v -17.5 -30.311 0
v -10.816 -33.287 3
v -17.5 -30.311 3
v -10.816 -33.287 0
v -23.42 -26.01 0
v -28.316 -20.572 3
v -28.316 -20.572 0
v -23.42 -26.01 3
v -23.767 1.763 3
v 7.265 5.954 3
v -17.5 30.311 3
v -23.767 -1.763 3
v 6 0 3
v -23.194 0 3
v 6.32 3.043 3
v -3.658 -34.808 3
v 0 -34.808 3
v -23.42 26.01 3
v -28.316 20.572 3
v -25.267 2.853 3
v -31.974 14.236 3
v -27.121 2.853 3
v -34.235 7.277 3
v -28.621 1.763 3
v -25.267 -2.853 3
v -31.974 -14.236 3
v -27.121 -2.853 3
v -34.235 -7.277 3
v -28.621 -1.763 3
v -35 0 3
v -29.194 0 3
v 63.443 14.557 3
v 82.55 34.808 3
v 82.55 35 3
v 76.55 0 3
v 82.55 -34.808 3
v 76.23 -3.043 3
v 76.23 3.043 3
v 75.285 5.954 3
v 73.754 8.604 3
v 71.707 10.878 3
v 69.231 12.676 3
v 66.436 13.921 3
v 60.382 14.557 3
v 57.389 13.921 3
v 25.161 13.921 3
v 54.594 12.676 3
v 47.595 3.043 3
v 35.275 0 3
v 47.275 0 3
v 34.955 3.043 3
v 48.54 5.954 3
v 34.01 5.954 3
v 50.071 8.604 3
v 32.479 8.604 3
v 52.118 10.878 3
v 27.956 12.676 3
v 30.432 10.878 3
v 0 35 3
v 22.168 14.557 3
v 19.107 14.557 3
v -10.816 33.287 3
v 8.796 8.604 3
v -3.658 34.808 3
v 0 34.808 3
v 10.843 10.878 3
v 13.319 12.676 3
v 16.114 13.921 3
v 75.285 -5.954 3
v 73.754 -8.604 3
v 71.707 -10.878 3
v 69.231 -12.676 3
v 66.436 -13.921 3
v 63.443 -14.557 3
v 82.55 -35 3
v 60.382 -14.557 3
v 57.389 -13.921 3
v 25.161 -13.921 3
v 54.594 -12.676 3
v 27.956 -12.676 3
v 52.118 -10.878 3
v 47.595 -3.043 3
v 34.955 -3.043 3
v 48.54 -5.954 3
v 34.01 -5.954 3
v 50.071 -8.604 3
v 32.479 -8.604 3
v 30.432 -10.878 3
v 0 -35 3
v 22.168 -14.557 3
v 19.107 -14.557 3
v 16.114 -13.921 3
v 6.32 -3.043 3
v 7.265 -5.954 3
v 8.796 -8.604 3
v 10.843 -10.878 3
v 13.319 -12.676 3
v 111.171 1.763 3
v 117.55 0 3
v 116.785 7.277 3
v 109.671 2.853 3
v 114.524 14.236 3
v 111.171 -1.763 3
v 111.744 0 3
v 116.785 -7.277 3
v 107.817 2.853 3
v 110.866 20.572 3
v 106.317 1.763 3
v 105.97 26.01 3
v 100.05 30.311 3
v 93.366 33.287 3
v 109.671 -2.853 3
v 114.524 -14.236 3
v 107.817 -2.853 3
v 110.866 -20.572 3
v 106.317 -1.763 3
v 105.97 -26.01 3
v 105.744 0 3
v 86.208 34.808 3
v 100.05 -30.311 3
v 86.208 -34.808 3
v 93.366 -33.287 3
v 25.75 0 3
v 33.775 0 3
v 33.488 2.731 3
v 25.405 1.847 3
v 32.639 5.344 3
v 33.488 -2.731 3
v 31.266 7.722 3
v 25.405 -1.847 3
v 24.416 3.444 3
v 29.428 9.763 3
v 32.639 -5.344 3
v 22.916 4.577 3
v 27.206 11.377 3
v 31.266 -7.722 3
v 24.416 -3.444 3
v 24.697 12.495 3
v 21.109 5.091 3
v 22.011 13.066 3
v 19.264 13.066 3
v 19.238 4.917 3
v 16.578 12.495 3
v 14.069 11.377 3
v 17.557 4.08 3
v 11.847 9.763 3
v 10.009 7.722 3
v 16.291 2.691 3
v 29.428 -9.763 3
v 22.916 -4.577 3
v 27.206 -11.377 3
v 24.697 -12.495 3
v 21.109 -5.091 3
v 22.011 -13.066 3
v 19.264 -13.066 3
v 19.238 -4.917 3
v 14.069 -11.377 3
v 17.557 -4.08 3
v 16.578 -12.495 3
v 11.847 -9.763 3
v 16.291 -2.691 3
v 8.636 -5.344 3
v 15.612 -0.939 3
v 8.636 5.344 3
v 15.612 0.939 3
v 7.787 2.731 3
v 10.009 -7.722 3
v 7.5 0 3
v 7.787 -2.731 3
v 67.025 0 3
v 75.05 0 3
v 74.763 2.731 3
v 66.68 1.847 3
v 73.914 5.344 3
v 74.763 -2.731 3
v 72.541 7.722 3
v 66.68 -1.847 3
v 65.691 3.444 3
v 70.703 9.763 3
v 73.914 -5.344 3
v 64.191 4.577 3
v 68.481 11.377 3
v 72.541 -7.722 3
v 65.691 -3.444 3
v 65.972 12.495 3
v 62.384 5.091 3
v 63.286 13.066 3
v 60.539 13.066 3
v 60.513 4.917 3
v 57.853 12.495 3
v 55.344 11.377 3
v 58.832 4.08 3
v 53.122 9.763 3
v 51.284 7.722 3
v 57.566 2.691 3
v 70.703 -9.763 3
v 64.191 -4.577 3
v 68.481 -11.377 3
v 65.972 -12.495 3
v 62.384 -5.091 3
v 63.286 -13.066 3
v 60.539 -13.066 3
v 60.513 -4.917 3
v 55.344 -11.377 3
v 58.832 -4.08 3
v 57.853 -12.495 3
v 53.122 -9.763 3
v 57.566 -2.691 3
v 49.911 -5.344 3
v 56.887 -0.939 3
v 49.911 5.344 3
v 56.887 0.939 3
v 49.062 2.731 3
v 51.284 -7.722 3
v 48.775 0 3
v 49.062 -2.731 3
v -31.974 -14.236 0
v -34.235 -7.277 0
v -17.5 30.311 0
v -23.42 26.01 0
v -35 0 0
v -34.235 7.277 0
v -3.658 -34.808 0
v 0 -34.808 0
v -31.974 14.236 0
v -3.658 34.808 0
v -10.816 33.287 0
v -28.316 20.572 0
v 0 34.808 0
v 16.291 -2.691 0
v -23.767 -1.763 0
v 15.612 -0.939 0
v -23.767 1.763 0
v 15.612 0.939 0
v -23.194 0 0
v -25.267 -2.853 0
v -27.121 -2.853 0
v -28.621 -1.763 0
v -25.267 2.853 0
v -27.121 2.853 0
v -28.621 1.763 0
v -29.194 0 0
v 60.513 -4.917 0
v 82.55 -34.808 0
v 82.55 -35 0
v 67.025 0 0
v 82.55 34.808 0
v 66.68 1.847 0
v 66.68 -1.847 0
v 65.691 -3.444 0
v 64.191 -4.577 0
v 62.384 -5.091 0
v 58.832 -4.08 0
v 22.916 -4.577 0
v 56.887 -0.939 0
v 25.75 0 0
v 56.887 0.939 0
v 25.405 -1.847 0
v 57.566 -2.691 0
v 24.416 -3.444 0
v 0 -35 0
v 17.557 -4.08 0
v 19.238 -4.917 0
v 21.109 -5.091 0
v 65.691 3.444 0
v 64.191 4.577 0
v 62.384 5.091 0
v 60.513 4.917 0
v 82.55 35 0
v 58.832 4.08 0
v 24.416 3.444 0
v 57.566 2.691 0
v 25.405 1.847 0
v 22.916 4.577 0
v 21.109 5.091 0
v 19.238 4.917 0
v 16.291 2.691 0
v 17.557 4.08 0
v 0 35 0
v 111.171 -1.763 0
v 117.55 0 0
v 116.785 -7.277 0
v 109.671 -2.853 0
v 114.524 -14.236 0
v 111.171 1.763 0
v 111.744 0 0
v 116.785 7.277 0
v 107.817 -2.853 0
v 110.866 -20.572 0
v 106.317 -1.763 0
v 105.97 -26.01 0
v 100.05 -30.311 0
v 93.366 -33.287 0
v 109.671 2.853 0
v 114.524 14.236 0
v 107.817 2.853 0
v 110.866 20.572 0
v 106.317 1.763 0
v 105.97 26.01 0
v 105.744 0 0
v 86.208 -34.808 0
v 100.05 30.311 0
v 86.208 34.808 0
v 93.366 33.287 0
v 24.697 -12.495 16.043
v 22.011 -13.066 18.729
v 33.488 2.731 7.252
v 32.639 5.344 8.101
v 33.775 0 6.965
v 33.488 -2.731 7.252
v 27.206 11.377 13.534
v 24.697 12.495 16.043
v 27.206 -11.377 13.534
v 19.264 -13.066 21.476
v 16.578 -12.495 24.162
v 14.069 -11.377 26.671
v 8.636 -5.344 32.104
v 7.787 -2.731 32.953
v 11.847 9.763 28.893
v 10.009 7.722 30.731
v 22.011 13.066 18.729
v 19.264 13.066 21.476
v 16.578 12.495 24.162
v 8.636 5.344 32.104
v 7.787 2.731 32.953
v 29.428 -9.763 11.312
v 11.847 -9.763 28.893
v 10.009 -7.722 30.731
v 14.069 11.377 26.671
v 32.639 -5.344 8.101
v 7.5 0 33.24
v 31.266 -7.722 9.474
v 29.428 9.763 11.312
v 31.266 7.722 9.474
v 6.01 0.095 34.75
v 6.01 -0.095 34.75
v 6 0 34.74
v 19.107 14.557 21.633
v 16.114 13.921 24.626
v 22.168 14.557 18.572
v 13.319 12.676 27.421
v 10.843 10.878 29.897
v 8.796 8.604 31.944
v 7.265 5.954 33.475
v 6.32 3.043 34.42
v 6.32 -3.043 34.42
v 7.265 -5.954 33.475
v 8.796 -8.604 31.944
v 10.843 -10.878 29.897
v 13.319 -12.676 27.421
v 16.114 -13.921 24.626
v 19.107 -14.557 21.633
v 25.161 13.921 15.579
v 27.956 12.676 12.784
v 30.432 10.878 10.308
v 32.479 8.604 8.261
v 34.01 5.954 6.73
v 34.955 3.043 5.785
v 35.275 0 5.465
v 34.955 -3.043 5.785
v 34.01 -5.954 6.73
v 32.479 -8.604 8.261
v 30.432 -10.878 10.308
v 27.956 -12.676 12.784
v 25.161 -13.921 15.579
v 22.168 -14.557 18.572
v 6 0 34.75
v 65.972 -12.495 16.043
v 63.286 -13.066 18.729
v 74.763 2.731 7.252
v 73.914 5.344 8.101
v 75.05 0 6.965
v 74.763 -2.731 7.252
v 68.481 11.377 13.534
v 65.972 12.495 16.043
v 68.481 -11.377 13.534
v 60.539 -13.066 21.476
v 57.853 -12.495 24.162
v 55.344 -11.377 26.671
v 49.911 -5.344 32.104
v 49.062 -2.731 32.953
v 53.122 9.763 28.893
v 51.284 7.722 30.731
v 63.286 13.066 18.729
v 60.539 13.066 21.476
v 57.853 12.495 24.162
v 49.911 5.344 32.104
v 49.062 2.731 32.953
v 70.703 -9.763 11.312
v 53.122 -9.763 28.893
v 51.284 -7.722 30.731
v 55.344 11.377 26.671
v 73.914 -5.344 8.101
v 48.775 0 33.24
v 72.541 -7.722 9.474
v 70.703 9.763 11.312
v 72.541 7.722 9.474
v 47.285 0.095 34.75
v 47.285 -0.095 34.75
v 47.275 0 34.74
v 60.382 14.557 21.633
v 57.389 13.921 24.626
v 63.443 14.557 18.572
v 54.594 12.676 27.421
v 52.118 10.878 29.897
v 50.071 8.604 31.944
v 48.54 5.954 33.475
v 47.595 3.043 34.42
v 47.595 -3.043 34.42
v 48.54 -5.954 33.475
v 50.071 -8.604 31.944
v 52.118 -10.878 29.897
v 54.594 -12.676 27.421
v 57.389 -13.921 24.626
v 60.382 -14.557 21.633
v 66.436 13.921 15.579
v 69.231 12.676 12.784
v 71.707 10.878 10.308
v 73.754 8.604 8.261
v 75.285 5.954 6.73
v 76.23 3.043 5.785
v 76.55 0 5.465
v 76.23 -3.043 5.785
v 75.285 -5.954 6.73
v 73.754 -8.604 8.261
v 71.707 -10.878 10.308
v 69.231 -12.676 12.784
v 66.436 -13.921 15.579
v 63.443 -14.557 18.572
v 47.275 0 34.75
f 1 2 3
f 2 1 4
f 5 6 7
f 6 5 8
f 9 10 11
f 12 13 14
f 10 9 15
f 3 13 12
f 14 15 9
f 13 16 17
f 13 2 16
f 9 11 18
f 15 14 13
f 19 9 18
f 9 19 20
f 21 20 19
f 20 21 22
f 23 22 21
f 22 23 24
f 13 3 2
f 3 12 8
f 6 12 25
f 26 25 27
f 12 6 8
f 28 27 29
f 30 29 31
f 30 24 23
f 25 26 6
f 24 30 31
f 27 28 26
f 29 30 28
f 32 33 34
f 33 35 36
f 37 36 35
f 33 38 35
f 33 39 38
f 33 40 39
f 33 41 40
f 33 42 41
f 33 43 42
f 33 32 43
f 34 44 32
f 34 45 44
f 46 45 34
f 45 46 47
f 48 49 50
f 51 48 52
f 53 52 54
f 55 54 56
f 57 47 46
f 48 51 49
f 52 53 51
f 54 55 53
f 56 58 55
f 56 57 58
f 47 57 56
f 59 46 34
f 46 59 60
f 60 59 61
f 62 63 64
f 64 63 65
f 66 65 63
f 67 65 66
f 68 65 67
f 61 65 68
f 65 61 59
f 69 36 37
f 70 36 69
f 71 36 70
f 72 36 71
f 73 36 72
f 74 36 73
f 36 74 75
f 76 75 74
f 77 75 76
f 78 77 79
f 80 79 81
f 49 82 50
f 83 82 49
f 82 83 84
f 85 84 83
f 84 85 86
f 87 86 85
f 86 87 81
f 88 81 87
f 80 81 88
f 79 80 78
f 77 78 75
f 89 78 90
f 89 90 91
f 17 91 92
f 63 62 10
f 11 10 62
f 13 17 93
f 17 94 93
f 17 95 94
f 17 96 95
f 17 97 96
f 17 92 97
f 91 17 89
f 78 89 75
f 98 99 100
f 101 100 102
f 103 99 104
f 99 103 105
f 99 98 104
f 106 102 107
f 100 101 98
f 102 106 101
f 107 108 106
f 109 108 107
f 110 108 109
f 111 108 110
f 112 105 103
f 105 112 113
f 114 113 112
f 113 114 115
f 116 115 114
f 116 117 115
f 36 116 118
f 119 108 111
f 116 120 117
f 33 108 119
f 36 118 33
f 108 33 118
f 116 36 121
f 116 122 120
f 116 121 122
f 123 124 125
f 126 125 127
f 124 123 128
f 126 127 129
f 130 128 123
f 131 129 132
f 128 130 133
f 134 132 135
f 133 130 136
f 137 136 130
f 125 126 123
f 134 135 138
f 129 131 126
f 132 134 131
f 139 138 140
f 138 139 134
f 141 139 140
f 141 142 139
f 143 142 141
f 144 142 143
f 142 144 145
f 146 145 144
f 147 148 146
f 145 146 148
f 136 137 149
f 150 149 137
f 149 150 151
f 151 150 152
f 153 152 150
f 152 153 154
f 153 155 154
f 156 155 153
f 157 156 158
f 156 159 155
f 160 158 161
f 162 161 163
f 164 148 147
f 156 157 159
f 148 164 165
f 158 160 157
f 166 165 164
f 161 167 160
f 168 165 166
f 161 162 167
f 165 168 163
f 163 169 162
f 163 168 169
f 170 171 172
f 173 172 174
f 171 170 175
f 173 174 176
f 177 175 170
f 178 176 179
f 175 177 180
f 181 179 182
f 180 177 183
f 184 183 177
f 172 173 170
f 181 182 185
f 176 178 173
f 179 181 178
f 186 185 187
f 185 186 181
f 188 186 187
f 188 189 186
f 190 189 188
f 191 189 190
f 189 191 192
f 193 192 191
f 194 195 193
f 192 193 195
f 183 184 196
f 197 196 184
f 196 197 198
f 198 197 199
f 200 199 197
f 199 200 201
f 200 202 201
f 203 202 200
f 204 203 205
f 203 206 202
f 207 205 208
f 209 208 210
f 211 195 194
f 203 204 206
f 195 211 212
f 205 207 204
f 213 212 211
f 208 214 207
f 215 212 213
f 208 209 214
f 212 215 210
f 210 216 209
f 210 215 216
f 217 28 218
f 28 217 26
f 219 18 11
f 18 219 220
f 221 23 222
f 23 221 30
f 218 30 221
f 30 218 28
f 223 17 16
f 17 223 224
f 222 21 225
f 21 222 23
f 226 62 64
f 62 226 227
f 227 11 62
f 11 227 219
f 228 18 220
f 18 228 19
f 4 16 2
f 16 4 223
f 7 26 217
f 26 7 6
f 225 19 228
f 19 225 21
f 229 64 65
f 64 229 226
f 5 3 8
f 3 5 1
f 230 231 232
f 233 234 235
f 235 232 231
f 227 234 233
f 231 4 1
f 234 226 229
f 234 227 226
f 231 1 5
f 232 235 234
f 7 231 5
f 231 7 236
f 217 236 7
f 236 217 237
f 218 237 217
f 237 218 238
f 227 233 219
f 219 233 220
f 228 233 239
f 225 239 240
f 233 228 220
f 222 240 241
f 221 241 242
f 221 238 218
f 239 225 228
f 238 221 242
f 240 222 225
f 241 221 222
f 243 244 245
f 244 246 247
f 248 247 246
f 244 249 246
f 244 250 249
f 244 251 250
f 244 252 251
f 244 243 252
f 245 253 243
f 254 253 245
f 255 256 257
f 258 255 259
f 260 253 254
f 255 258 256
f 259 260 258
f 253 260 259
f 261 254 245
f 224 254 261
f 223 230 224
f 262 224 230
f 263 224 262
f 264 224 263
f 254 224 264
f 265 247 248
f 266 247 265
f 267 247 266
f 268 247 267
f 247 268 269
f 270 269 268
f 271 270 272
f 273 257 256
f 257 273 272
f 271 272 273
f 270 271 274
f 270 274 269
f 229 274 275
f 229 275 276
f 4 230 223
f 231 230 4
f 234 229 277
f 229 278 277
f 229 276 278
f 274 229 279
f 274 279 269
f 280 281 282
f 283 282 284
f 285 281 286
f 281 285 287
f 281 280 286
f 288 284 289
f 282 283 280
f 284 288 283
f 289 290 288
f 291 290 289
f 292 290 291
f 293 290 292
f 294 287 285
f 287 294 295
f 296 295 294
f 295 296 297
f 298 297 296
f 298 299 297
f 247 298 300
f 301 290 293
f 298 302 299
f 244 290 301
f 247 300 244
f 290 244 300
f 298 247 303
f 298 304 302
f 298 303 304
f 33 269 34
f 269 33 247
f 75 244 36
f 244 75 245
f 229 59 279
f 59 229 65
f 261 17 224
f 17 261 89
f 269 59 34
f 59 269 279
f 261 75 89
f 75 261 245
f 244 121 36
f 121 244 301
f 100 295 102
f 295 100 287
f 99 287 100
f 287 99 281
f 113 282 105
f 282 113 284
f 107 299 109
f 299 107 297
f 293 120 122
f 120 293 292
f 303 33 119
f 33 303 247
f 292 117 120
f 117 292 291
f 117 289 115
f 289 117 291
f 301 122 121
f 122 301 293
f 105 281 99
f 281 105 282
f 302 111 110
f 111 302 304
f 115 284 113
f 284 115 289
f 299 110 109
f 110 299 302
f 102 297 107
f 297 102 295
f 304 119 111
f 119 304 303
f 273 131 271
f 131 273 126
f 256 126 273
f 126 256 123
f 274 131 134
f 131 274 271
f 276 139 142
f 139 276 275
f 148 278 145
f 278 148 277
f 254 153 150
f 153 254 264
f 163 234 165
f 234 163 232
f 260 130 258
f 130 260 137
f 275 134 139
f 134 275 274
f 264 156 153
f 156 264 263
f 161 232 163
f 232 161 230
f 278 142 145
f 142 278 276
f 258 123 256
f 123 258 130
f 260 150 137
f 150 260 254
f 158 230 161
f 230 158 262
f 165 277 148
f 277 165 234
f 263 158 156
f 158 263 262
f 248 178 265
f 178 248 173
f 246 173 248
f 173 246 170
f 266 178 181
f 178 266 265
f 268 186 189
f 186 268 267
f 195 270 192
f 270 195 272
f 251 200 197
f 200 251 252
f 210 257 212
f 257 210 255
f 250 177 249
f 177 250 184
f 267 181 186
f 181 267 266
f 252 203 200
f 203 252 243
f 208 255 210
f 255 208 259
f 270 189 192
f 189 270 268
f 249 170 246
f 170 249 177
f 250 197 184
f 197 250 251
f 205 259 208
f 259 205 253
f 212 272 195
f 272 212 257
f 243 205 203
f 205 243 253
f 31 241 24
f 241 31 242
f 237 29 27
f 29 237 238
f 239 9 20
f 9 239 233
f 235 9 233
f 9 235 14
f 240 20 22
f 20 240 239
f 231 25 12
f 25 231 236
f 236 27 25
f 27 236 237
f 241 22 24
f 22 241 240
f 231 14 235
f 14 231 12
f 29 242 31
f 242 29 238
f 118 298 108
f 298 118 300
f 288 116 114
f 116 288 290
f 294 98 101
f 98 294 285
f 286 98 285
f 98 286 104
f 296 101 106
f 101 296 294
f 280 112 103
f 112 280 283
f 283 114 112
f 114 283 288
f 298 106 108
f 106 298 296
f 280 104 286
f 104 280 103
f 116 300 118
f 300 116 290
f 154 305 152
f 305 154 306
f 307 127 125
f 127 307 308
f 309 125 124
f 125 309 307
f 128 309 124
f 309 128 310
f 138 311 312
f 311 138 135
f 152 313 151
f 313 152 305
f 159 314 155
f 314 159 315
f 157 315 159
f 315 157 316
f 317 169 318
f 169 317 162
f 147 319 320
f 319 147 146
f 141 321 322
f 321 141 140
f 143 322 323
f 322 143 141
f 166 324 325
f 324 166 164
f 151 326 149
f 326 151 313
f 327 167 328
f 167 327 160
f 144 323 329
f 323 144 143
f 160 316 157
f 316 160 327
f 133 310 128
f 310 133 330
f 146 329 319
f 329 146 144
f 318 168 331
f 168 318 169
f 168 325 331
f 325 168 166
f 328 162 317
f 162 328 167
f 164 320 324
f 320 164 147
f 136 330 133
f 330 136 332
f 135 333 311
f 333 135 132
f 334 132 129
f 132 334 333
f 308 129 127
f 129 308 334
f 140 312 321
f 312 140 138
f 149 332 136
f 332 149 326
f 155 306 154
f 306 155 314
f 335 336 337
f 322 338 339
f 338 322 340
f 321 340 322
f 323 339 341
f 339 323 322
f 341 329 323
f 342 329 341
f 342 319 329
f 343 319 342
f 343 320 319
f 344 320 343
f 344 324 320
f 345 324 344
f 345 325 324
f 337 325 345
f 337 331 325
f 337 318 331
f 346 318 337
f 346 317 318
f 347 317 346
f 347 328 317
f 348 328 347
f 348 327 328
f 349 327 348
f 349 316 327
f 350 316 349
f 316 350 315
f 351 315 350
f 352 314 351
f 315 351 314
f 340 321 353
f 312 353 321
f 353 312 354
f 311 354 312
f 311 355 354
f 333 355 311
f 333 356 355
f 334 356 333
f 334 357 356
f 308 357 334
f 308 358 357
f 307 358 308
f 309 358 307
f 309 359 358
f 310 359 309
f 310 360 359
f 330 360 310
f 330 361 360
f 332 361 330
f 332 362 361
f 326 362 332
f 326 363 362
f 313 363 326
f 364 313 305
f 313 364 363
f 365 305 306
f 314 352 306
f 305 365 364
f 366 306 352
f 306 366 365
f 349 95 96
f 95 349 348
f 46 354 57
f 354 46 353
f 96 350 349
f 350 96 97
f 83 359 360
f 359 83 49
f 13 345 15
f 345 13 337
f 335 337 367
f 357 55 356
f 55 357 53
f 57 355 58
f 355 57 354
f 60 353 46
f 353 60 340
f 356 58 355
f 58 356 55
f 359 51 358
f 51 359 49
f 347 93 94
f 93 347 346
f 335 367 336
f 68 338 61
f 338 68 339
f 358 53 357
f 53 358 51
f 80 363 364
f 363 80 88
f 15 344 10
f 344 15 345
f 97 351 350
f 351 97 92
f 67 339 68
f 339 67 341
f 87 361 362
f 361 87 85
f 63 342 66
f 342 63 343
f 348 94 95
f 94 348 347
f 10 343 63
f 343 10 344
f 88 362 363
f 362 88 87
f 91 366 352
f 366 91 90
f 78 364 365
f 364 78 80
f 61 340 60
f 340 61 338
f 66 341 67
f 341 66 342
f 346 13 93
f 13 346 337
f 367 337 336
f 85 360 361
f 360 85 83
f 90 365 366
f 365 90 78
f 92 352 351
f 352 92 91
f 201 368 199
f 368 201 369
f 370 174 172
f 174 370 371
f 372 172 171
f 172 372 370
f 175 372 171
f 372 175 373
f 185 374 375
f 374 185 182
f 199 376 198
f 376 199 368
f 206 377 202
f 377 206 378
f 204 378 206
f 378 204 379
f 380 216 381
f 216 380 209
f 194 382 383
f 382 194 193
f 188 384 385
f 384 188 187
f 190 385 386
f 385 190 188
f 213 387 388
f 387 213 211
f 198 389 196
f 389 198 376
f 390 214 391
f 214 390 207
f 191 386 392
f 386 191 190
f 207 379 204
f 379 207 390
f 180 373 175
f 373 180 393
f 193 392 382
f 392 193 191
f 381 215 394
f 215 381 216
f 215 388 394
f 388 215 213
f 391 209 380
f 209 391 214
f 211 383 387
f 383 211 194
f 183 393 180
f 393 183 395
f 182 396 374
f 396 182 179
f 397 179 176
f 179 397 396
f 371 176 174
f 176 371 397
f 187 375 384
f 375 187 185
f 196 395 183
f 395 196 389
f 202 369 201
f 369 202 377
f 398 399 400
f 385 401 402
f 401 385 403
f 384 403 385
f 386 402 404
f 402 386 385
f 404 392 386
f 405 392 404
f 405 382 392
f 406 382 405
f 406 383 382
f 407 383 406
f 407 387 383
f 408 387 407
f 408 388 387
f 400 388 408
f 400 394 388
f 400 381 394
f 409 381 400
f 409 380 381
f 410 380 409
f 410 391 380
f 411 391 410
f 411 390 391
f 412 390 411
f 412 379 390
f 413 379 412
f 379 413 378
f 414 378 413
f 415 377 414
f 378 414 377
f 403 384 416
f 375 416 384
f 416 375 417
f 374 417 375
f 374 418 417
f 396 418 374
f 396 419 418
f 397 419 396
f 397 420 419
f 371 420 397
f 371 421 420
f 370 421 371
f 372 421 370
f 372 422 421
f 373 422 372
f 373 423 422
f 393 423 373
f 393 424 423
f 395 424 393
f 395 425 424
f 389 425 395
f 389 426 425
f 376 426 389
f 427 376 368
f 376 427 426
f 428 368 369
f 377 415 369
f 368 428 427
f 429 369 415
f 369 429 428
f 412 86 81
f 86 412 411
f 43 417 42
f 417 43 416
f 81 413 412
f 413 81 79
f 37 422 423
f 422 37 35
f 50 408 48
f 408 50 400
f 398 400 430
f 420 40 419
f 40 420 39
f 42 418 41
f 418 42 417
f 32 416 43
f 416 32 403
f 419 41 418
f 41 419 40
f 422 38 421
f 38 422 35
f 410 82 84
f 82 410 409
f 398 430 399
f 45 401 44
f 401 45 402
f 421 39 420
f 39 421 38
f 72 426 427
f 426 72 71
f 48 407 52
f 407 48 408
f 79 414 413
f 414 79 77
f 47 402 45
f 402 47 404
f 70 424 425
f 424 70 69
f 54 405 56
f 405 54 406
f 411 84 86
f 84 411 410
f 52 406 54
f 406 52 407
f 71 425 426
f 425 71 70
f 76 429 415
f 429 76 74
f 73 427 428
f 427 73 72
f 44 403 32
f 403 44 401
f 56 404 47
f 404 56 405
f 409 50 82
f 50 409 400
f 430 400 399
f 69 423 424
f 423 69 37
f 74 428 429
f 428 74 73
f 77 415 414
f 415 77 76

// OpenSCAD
// signal for Finger Lakes Live Steamers 1.5" to the foot model railway

// customizer
// http://customizer.makerbot.com/docs

// How many aspects?
aspect_count = 0.5; // [0.5: two aspects, 0:three aspects]


thickness_of_backplate = 3 * 1;
width_of_backplate = 70 * 1;
diameter_of_signal = 3 / 8 * 25.4 + .7;
diameter_of_ring = 3 / 4 * 25.4;
shroud_thickness = 1.5 * 1;
buffer = diameter_of_ring / 2 - shroud_thickness;
shroud_height = 1.25 * 25.4;
spacing = (1 + 5 / 8) * 25.4;
screw_spacing = (5 + 5/16) * 25.4;
screw_radius = 3 * 1;

spacing1 = spacing * (0 + aspect_count);
spacing2 = spacing * (1 + aspect_count);
spacing3 = spacing * (2 + aspect_count);

if (spacing * 2 + width_of_backplate *2 < screw_spacing) { echo("no good"); }

difference() {
    union() {
        cylinder(r = width_of_backplate / 2, h = thickness_of_backplate);
        translate([0, -width_of_backplate/2, 0])
            cube([spacing *2, width_of_backplate, thickness_of_backplate]);
        translate([spacing*2, 0, 0])
            cylinder(r = width_of_backplate / 2, h = thickness_of_backplate);
    }        
    translate([0,0,-0.01]) {
        translate([spacing1, 0, 0])
            cylinder(r = diameter_of_signal/2, h = thickness_of_backplate + .02);
        translate([spacing2, 0, 0])
            cylinder(r = diameter_of_signal/2, h = thickness_of_backplate + .02);
        if (! aspect_count) {
            translate([spacing3, 0, 0])
                cylinder(r = diameter_of_signal/2, h = thickness_of_backplate + .02);
        }
        translate([-( screw_spacing / 2 - spacing),0,0])
            cylinder(r = screw_radius, h = thickness_of_backplate + .02);
        translate([spacing*2 + ( screw_spacing / 2 - spacing),0,0])
            cylinder(r = screw_radius, h = thickness_of_backplate + .02);
    }
}

// shrouds


module shroud() {
    difference() {
        cylinder(r = diameter_of_signal/2 + buffer + shroud_thickness, h=shroud_height);
        translate([0,0,-0.01]) {
            cylinder(r = diameter_of_signal/2 + buffer, h=shroud_height + .02);
            *translate([0,-(diameter_of_signal/2 + buffer + shroud_thickness),0])
                cube([diameter_of_signal + buffer*2 + shroud_thickness*2, diameter_of_signal + buffer*2 + shroud_thickness*2, shroud_height + .02]);
        translate([-(diameter_of_signal/2 + buffer + shroud_thickness),diameter_of_signal/2 + buffer + shroud_thickness,shroud_height])
            rotate([90,45,0])
                cube([shroud_height*1.5,shroud_height,shroud_height]);
        }
    }
}

translate([spacing1, 0, thickness_of_backplate]) shroud();
translate([spacing2, 0, thickness_of_backplate]) shroud();
if (! aspect_count) {
    translate([spacing3, 0, thickness_of_backplate]) shroud();
}
